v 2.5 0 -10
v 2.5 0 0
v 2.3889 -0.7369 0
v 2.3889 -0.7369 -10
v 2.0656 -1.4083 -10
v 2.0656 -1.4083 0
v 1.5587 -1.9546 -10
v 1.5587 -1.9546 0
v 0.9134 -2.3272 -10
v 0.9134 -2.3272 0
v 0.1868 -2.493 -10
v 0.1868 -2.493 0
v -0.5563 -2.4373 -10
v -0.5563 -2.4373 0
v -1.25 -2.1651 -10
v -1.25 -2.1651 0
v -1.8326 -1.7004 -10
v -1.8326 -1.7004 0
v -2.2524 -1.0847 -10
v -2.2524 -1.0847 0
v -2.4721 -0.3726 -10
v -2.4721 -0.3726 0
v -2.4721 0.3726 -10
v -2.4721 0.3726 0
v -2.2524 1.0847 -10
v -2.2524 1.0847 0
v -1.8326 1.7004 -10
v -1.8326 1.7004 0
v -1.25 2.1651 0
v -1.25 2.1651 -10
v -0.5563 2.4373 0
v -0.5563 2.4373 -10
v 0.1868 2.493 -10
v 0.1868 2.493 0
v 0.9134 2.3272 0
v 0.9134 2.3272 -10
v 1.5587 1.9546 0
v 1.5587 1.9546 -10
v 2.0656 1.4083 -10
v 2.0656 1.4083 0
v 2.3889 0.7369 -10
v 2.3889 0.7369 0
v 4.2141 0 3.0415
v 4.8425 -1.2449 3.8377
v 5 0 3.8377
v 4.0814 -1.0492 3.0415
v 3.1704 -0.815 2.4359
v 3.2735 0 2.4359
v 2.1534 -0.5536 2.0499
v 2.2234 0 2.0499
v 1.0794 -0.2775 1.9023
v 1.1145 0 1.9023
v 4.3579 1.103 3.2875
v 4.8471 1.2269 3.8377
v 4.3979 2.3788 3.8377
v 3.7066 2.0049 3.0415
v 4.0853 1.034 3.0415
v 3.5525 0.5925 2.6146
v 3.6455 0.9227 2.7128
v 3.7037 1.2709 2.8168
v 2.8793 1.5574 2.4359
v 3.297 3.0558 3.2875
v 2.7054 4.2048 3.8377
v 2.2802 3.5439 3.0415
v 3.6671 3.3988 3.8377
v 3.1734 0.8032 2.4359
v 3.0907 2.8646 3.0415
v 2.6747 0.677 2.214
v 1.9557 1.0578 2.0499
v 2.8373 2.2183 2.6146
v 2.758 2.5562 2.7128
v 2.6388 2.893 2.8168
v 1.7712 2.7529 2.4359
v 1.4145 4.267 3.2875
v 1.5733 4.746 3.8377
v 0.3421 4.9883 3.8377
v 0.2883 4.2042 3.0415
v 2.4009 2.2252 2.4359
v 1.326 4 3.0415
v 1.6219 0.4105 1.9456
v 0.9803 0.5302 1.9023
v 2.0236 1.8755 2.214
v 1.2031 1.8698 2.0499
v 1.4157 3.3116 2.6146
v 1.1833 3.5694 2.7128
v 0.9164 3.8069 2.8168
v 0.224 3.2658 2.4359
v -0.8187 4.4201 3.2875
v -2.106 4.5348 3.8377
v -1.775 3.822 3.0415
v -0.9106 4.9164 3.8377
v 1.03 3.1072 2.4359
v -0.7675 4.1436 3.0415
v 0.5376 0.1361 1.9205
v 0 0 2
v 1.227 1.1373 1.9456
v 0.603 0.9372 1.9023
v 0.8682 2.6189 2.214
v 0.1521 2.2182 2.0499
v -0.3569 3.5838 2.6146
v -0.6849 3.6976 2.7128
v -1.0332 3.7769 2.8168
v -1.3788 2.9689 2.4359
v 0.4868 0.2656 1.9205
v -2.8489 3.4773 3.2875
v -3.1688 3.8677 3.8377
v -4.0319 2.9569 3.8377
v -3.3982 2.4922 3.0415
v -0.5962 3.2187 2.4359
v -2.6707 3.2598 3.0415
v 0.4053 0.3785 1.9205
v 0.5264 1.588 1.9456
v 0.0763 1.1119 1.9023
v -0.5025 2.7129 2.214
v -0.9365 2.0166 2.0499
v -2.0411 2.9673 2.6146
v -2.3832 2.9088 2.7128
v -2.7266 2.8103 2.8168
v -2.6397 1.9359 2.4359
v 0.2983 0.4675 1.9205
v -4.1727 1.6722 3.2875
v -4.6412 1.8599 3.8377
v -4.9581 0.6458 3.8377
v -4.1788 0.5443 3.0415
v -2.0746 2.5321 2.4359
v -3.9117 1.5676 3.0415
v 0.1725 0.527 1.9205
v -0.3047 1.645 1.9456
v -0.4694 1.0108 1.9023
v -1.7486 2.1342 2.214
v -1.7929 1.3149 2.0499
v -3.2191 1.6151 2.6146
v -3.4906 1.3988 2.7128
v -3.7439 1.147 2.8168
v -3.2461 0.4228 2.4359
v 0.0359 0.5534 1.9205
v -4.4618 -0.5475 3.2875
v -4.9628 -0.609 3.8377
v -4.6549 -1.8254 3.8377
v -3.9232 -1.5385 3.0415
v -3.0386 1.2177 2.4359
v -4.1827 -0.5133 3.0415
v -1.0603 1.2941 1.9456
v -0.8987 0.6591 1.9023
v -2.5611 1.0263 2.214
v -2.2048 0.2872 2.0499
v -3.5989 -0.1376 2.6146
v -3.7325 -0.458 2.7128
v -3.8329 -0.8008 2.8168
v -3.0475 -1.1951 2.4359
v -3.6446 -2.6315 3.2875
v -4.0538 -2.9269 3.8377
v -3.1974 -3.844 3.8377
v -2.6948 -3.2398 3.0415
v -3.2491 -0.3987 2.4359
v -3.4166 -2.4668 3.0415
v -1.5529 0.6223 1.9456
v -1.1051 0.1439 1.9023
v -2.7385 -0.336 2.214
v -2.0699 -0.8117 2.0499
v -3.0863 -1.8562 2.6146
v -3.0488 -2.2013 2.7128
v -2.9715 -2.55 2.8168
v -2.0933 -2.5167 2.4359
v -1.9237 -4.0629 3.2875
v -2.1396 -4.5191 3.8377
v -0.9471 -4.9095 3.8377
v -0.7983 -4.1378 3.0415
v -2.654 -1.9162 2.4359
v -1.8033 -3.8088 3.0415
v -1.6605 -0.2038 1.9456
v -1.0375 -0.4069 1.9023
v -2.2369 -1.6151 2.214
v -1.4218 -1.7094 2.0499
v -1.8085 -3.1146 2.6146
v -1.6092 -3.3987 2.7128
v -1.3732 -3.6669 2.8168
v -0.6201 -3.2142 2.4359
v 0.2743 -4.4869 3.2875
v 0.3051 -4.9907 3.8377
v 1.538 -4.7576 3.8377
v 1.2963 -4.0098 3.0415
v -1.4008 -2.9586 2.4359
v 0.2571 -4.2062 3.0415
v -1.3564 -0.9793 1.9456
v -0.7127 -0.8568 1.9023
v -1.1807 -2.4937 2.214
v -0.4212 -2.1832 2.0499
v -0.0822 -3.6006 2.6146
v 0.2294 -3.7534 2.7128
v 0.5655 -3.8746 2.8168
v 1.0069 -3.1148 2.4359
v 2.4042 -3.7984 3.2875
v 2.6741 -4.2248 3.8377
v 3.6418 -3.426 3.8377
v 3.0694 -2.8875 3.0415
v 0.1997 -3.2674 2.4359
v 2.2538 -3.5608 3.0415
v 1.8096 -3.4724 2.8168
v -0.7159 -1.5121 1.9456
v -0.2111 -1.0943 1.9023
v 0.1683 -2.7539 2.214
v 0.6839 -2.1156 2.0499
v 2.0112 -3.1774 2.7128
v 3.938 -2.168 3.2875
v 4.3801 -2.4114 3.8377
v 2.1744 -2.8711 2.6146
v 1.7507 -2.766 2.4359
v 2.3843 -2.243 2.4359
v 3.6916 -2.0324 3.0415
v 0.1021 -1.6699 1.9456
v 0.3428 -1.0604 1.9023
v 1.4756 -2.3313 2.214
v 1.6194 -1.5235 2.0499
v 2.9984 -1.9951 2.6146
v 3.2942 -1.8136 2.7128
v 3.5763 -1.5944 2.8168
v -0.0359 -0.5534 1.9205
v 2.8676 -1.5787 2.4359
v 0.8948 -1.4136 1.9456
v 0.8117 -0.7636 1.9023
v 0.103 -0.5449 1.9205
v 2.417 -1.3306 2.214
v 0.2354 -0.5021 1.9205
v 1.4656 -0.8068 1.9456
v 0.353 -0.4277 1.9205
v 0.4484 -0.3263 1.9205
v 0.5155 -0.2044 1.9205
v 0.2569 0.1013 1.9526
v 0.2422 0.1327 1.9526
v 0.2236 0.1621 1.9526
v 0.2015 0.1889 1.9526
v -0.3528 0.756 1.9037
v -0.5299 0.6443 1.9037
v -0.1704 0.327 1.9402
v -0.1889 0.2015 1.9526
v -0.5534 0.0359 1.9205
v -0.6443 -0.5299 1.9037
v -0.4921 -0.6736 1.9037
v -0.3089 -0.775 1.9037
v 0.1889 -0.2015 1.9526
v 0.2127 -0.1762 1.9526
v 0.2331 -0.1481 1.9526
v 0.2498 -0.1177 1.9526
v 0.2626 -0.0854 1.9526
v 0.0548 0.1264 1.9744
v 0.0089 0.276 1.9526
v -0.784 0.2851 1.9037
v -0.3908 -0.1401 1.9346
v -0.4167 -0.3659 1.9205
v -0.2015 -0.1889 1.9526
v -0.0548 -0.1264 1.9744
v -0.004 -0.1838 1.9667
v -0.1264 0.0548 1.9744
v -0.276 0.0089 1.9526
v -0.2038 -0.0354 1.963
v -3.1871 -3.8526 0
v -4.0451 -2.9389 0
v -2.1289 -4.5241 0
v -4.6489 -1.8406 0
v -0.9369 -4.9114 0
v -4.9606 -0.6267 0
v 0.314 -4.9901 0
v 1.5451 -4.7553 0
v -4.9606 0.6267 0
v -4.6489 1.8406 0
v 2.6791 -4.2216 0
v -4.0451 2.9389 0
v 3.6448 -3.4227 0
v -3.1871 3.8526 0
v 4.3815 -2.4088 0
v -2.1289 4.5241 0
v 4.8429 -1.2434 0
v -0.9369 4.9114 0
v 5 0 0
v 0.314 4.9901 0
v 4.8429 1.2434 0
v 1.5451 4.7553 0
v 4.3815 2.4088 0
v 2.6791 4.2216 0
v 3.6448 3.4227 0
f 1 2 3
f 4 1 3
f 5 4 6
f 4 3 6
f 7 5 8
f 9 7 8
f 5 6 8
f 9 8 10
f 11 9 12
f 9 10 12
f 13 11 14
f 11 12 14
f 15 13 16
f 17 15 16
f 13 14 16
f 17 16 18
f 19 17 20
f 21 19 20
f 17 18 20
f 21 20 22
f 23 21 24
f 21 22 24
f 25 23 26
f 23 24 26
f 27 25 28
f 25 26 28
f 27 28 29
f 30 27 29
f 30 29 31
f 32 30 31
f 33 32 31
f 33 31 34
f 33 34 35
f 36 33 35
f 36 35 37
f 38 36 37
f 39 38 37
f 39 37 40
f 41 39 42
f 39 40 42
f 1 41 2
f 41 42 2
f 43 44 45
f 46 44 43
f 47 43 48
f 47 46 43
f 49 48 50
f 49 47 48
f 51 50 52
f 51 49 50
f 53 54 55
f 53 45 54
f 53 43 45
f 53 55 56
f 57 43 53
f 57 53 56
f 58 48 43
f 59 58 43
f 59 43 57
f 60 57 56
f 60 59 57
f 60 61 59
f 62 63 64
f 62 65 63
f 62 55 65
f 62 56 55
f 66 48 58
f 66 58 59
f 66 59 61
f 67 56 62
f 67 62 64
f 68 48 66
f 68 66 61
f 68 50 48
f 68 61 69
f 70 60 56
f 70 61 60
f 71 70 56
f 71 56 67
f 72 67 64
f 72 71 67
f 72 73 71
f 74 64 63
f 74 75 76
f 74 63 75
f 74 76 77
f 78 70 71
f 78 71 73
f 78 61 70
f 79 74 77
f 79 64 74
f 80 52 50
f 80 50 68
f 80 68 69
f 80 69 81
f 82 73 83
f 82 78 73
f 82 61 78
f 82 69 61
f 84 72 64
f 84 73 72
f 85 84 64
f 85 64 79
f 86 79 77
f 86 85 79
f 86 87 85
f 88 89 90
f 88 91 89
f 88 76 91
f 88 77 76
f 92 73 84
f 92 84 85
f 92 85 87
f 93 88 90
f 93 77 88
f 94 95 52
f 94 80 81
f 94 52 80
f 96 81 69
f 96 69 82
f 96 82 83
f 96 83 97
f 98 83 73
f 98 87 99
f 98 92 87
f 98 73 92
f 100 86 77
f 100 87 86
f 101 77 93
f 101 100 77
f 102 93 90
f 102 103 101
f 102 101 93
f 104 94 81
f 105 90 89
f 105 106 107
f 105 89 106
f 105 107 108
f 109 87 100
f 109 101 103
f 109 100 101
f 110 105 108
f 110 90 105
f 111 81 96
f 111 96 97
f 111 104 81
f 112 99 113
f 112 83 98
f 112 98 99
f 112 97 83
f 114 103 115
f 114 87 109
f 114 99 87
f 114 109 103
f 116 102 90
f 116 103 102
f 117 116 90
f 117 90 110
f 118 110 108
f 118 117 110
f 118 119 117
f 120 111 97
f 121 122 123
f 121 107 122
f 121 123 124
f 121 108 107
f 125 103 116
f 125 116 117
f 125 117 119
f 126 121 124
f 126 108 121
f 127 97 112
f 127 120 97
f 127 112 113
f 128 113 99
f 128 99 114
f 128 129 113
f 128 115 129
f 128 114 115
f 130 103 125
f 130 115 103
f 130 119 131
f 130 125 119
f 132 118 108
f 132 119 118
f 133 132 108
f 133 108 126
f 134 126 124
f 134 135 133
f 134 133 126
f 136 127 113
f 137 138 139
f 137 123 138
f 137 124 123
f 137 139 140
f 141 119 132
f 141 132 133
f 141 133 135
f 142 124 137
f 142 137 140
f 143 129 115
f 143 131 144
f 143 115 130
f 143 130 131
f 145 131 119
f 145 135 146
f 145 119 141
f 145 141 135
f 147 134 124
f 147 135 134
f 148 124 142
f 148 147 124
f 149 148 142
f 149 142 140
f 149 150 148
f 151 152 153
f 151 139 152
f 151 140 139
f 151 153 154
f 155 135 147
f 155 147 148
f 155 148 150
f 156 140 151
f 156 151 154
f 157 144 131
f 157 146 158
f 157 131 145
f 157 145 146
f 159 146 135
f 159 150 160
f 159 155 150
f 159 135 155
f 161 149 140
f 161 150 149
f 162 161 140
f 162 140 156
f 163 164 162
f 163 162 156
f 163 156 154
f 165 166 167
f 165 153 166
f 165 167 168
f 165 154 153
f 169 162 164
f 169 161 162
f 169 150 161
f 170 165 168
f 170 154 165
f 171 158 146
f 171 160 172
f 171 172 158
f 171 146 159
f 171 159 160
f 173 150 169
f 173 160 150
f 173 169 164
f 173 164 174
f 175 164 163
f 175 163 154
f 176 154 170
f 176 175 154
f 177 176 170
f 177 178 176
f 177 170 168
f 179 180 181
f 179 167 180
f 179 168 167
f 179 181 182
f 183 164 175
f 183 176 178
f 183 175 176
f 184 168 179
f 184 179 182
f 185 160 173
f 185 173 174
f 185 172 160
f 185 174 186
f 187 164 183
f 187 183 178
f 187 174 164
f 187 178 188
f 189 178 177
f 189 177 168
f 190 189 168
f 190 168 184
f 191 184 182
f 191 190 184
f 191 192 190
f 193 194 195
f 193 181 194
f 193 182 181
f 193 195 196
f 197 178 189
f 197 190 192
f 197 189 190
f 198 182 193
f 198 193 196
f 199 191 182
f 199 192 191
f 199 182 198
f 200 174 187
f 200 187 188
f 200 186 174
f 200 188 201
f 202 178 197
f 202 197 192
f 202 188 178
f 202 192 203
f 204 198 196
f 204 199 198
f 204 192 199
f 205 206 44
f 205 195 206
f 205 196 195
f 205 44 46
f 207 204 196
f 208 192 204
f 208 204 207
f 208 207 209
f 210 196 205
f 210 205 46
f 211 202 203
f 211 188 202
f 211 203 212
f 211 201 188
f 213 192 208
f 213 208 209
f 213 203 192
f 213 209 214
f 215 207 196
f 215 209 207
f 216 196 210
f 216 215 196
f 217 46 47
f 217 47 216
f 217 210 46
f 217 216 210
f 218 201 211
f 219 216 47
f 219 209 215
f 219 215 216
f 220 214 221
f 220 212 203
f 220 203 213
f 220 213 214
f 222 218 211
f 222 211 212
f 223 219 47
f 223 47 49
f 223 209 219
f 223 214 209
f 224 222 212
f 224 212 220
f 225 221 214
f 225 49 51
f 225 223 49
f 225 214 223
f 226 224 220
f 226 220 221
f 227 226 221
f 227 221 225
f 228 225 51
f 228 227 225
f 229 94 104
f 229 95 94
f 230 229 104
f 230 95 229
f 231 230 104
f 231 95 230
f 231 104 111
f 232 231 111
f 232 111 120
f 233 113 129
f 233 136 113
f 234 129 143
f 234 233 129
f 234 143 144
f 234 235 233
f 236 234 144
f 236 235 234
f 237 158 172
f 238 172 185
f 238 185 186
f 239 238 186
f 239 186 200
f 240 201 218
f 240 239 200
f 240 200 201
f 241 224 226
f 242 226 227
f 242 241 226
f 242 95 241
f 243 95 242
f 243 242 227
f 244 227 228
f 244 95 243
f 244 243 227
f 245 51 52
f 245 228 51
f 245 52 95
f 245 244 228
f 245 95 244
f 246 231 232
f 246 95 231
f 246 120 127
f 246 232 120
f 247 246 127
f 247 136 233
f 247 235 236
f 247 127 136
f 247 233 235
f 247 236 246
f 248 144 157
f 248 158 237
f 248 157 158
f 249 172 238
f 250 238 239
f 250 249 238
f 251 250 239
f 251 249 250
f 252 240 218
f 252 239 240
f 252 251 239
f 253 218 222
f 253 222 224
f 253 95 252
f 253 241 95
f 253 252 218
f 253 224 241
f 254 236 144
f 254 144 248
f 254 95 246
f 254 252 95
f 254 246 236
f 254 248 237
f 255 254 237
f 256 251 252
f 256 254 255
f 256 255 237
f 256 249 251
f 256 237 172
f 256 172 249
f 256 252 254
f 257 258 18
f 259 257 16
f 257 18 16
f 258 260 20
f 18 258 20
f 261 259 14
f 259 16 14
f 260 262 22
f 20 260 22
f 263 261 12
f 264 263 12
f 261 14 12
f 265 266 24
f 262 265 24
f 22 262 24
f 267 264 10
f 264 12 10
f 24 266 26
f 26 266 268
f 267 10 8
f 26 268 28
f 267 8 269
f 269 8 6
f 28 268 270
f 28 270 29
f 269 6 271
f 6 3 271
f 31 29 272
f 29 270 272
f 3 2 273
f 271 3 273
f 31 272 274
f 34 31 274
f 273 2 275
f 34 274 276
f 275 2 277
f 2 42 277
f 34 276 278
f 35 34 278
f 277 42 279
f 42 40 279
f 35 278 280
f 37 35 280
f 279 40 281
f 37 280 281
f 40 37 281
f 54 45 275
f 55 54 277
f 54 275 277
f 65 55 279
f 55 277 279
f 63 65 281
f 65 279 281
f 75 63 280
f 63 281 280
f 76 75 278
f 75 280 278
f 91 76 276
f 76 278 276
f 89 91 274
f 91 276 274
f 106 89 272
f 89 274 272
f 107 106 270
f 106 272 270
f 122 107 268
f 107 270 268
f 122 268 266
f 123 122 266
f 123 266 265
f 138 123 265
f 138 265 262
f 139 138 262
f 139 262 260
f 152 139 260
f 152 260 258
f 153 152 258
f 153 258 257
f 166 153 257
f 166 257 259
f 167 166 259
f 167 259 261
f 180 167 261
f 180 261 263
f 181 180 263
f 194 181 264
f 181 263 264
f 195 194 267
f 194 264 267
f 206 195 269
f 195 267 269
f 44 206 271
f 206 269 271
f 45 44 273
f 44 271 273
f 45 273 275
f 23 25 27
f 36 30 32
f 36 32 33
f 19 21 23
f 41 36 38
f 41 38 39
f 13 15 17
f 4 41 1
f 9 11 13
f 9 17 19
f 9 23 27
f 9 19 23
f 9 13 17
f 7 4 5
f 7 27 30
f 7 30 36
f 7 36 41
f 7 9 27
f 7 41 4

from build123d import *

# Parameters (mm, degrees)
SKETCH1_R           = 5
BOSS_EXTRUDE1_DEPTH = 6
SKETCH4_R           = 2.5
BOSS_EXTRUDE2_DEPTH = 10


with BuildPart() as part:
    # Sketch1 → Boss-Extrude1 (new body)
    with BuildSketch(Plane.XY):
        Circle(SKETCH1_R)
    extrude(amount=BOSS_EXTRUDE1_DEPTH)

    # Sketch3 → Cut-Revolve1 (revolve, cut)
    with BuildSketch(Plane(origin=(0, 0, 0), x_dir=(0, 0, -1), z_dir=(1, 0, 0)), mode=Mode.PRIVATE) as cut_revolve1_sk:
        with BuildLine():
            Line((-6, 0), (-9.957172865, 0))
            Line((-9.957172865, 0), (-9.957172865, 5.514350083))
            Line((-9.957172865, 5.514350083), (-9.957172865, 6))
            Line((-9.957172865, 6), (-6, 6))
            ThreePointArc((-6, 6), (-2.757359313, 3.828427125), (-2, 0))
            Line((-2, 0), (-6, 0))
        make_face()
    revolve(cut_revolve1_sk.sketch.rotate(Axis((0, 0, 0), (0, 0, 1)), 270), axis=Axis((0, 0, 0), (0, 0, 1)), mode=Mode.SUBTRACT)

    # Sketch4 → Boss-Extrude2 (add)
    with BuildSketch(Plane(origin=(0, 0, 0), x_dir=(-1, 0, 0), z_dir=(0, 0, -1))):
        with Locations(Location((0, 0, 0), (0, 0, 180))):
            Circle(SKETCH4_R)
    extrude(amount=BOSS_EXTRUDE2_DEPTH)


solid = part.part
